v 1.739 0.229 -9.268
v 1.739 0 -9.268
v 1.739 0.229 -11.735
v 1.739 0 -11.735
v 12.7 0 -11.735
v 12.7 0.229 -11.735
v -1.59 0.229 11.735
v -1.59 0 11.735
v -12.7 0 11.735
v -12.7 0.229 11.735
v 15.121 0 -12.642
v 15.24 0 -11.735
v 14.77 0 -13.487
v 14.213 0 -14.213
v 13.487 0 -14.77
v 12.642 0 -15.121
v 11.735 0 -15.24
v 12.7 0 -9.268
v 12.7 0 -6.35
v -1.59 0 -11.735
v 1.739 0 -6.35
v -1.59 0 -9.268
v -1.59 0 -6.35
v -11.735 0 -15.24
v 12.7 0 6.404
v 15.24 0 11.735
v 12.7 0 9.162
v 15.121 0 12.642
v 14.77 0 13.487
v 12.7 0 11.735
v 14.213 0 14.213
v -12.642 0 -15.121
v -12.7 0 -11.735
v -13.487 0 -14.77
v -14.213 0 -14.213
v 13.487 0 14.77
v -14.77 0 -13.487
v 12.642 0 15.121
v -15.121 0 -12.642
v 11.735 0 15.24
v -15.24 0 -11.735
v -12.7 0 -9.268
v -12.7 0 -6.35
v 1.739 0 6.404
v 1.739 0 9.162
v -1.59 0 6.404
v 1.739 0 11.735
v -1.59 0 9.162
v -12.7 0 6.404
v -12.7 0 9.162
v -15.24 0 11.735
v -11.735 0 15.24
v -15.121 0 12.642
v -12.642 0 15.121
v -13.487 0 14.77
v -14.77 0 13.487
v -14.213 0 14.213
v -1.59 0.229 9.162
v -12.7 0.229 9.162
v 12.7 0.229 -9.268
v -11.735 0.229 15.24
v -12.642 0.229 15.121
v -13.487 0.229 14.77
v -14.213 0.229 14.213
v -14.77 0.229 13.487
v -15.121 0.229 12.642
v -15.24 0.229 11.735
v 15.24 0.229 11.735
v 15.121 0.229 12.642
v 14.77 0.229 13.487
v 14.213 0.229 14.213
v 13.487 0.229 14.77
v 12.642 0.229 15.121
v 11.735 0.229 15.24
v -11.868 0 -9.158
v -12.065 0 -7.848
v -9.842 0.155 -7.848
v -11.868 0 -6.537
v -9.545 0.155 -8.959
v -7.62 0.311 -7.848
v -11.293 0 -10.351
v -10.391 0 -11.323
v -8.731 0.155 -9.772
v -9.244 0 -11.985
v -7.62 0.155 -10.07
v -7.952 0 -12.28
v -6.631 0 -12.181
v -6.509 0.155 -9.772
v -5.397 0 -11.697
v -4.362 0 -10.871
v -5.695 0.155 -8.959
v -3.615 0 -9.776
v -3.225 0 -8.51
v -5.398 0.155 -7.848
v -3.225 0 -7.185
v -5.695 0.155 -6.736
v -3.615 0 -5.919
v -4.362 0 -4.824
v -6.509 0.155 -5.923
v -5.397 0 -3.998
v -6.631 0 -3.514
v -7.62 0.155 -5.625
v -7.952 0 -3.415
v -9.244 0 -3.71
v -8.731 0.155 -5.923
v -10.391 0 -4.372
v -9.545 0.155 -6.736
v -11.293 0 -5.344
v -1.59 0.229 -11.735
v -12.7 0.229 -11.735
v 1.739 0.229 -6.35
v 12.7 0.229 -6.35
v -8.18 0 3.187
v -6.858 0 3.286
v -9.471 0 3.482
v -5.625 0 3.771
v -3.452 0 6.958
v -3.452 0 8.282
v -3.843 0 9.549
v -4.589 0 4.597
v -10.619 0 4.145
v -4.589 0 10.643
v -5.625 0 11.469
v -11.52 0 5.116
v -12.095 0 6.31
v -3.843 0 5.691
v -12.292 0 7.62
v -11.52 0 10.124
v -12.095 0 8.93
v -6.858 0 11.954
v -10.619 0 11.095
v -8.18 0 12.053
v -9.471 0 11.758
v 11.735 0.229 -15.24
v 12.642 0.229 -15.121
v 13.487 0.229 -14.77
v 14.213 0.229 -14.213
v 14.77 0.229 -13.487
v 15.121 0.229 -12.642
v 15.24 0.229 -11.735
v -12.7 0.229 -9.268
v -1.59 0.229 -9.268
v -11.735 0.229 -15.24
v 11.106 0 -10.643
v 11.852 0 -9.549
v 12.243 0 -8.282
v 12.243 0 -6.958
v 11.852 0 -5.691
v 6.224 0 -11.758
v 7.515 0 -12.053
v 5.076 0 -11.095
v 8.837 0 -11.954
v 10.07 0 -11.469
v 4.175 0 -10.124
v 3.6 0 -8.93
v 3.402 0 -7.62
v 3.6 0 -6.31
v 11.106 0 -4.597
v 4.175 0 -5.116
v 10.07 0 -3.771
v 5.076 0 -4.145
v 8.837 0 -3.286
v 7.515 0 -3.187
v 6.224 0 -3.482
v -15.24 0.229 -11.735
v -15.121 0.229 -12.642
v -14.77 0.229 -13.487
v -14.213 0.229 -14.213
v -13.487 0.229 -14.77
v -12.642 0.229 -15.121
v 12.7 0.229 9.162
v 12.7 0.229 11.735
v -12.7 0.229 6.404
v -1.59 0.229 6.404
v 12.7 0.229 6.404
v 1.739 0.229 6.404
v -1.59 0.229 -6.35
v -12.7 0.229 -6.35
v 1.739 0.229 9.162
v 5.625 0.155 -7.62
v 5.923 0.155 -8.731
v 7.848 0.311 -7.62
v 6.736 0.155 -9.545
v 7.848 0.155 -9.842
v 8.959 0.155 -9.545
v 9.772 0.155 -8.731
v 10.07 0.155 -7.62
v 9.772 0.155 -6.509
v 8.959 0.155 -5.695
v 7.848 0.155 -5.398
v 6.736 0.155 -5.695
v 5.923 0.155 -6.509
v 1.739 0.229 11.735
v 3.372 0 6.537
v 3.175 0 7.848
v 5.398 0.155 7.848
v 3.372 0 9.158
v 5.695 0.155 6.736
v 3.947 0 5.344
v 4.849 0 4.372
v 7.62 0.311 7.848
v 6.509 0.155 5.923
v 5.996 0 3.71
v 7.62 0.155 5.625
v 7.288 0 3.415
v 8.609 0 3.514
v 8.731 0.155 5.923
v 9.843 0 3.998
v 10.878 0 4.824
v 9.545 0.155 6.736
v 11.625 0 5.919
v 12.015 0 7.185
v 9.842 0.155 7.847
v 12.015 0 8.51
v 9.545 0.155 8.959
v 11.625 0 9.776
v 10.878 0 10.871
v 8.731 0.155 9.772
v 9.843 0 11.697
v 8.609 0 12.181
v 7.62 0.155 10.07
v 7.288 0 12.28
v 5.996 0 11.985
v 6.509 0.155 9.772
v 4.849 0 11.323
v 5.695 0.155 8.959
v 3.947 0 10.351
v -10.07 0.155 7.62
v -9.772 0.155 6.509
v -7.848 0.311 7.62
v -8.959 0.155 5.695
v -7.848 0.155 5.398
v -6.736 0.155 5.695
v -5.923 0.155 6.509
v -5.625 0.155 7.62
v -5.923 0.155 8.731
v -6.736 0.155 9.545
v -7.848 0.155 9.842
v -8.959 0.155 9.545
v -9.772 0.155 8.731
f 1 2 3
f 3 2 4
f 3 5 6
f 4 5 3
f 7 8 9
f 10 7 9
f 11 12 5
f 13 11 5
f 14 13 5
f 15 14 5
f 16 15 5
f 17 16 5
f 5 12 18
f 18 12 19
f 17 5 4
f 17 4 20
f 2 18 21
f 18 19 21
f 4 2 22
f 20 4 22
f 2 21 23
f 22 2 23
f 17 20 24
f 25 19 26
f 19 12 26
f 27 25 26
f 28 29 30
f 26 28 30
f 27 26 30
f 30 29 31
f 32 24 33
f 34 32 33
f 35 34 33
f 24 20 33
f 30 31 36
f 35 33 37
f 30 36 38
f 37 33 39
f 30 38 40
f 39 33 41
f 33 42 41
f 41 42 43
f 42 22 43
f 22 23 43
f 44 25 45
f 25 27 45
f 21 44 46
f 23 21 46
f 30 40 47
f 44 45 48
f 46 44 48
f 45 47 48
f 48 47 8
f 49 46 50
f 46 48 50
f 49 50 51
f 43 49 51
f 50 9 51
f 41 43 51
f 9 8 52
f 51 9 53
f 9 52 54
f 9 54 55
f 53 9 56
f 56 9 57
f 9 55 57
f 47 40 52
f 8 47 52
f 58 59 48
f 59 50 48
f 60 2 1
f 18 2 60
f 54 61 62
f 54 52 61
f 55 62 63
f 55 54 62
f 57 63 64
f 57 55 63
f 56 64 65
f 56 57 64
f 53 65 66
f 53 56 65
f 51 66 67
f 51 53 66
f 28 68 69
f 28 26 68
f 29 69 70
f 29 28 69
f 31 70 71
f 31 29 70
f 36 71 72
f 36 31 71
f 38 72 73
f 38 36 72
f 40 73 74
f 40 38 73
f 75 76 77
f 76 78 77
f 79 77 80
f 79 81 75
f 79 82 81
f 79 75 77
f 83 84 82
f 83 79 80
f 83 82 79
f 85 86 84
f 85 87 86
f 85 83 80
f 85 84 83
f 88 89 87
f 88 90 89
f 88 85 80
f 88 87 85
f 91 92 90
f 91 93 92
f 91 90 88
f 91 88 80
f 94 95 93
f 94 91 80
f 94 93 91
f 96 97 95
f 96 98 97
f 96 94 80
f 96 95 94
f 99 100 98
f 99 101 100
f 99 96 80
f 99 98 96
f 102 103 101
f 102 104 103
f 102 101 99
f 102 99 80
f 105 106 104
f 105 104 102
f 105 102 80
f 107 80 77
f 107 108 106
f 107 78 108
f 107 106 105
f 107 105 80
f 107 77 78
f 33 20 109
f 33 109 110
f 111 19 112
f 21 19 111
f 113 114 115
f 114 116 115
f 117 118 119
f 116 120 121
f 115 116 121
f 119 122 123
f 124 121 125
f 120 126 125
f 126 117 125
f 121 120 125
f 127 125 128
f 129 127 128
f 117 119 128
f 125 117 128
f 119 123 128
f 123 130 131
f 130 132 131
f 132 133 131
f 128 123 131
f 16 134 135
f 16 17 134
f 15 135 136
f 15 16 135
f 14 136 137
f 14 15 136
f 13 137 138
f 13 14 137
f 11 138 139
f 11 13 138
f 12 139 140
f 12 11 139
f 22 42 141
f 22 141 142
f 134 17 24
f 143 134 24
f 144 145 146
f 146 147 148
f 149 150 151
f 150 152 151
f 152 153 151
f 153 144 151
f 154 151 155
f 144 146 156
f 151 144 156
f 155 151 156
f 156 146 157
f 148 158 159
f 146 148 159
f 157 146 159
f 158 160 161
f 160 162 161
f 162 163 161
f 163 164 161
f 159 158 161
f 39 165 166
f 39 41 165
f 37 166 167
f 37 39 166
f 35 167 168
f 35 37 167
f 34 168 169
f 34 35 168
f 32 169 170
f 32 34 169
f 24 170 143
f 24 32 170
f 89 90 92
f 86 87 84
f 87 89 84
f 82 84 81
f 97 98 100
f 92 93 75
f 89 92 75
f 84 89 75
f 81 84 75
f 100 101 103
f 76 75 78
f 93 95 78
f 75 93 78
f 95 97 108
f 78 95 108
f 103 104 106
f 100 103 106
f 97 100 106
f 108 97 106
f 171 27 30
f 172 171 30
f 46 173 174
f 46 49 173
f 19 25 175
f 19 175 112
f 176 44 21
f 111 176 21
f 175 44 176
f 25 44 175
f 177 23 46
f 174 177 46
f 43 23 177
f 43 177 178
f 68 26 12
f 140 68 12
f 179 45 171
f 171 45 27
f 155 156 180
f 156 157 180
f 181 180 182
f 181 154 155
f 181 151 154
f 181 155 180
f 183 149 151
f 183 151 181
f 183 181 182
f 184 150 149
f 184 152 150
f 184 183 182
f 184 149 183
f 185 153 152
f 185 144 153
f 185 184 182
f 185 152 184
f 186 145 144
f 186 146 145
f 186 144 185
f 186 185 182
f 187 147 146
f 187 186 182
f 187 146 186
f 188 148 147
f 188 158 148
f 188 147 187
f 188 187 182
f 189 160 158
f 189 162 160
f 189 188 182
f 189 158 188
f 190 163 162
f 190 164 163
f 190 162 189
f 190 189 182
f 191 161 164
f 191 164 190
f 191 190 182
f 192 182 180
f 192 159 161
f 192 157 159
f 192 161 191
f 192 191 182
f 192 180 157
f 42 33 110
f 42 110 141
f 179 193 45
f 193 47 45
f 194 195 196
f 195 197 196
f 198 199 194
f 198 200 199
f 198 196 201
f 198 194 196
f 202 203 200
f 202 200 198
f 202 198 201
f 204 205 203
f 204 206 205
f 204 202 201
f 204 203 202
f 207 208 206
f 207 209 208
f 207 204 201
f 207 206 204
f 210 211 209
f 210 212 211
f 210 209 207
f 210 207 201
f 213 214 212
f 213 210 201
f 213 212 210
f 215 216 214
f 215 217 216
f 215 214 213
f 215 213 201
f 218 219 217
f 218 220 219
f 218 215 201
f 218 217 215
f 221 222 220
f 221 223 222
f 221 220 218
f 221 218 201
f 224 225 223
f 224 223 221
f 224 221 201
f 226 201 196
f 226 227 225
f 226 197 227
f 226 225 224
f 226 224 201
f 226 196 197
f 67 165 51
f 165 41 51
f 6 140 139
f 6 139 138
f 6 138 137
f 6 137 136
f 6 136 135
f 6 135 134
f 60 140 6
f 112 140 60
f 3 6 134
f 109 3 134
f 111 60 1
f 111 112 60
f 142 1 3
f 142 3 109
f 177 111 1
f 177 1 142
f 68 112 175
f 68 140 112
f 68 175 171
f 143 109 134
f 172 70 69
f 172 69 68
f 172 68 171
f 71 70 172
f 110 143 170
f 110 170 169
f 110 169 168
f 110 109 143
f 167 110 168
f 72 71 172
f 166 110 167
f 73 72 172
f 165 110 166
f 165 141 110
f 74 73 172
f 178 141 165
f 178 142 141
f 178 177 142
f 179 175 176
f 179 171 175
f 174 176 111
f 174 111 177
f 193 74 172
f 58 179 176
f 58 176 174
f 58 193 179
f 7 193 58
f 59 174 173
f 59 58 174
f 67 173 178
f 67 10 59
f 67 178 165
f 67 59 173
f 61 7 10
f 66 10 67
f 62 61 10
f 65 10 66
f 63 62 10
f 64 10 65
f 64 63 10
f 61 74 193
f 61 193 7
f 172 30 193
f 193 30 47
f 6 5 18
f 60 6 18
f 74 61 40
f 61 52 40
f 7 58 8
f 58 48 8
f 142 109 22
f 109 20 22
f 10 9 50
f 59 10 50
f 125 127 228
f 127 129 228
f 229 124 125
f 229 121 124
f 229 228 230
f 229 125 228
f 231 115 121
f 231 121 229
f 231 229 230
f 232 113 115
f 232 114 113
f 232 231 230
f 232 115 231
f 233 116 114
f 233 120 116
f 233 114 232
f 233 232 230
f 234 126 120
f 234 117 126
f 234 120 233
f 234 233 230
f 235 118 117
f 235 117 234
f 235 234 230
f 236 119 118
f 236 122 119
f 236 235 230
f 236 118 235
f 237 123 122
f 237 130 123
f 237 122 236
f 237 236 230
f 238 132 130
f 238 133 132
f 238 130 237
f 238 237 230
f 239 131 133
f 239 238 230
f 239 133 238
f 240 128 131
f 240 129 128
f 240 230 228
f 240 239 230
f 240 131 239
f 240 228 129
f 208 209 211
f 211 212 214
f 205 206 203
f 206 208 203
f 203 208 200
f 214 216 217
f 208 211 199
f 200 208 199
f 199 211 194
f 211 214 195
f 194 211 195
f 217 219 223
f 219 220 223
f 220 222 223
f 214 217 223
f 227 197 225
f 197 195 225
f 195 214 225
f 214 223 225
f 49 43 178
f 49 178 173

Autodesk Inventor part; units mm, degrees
ref_plane "YZ Plane" through (0, 0, 0) normal (1, 0, 0) x (0, 1, 0)
ref_plane "XZ Plane" through (0, 0, 0) normal (0, 1, 0) x (-1, 0, 0)
ref_plane "XY Plane" through (0, 0, 0) normal (0, 0, 1) x (1, 0, 0)
sketch "Sketch1" plane through (0, 0, 0) normal (0, 1, 0) x (-1, 0, 0)
  line L0 (-15.24, 11.7348) -> (-15.24, -11.7348)
  line L1 (-11.7348, -15.24) -> (11.7348, -15.24)
  line L2 (15.24, -11.7348) -> (15.24, 11.7348)
  line L3 (11.7348, 15.24) -> (-11.7348, 15.24)
  line L4 (-15.24, 15.24) -> (15.24, -15.24) construction
  line L5 (-15.24, -15.24) -> (15.24, 15.24) construction
  arc A0 (15.24, 11.7348) -> (11.7348, 15.24) centre (11.7348, 11.7348) ccw
  arc A1 (11.7348, -15.24) -> (15.24, -11.7348) centre (11.7348, -11.7348) ccw
  arc A2 (-15.24, -11.7348) -> (-11.7348, -15.24) centre (-11.7348, -11.7348) ccw
  arc A3 (-11.7348, 15.24) -> (-15.24, 11.7348) centre (-11.7348, 11.7348) ccw
  line L6 (-18.4479, 18.3502) -> (18.4026, 18.3502) construction
  line L7 (18.4026, 18.3502) -> (18.4026, -18.5003) construction
  line L8 (18.4026, -18.5003) -> (-18.4479, -18.5003) construction
  line L9 (-18.4479, -18.5003) -> (-18.4479, 18.3502) construction
  line L10 (12.7, 11.7348) -> (12.7, 9.1616)
  arc A4 (11.7348, -12.7) -> (12.7, -11.7348) centre (11.7348, -11.7348) ccw
  line L11 (11.7348, -12.7) -> (-11.7348, -12.7)
  arc A5 (-12.7, -11.7348) -> (-11.7348, -12.7) centre (-11.7348, -11.7348) ccw
  line L12 (-12.7, -11.7348) -> (-12.7, -9.2677)
  arc A6 (-11.7348, 12.7) -> (-12.7, 11.7348) centre (-11.7348, 11.7348) ccw
  line L13 (-11.7348, 12.7) -> (11.7348, 12.7)
  arc A7 (12.7, 11.7348) -> (11.7348, 12.7) centre (11.7348, 11.7348) ccw
  line L14 (12.7, 9.1616) -> (1.5905, 9.1616)
  line L15 (-12.7, 9.1616) -> (-12.7, 11.7348)
  line L16 (-12.7, 11.7348) -> (-1.7389, 11.7348)
  line L17 (12.7, 11.7348) -> (12.7, 9.1616)
  line L18 (12.7, -9.2677) -> (1.5905, -9.2677)
  line L19 (-12.7, -9.2677) -> (-12.7, -11.7348)
  line L20 (-12.7, -11.7348) -> (-1.7389, -11.7348)
  line L21 (12.7, -11.7348) -> (12.7, -9.2677)
  line L22 (-12.7, 9.1616) -> (-12.7, 11.7348)
  line L23 (12.7, 6.4035) -> (6.4035, 6.4035)
  line L24 (-12.7, 6.4035) -> (-12.7, -6.3499)
  line L25 (-12.7, -6.3499) -> (-1.7389, -6.3499)
  line L26 (12.7, -6.3499) -> (12.7, 6.4035)
  line L27 (12.7, -6.3499) -> (12.7, -9.2677)
  line L28 (12.7, 6.4035) -> (12.7, -6.3499)
  line L29 (12.7, 9.1616) -> (12.7, 6.4035)
  line L30 (12.7, -9.2677) -> (12.7, -11.7348)
  line L31 (-12.7, -9.2677) -> (-12.7, -6.3499)
  line L32 (-12.7, -6.3499) -> (-12.7, 6.4035)
  line L33 (-12.7, 6.4035) -> (-12.7, 9.1616)
  line L34 (1.5905, 11.7348) -> (-1.7389, 11.7348)
  line L35 (-1.7389, 11.7348) -> (-1.7389, -11.7348)
  line L36 (-1.7389, -11.7348) -> (1.5905, -11.7348)
  line L37 (1.5905, -11.7348) -> (1.5905, 11.7348)
  line L38 (1.5905, 11.7348) -> (12.7, 11.7348)
  line L39 (-1.7389, 11.7348) -> (1.5905, 11.7348)
  line L40 (1.5905, -11.7348) -> (12.7, -11.7348)
  line L41 (-1.7389, -11.7348) -> (1.5905, -11.7348)
  line L42 (1.5905, 9.1616) -> (-1.7389, 9.1616)
  line L43 (-1.7389, 9.1616) -> (-12.7, 9.1616)
  line L44 (6.4035, 6.4035) -> (1.5905, 6.4035)
  line L45 (1.5905, 6.4035) -> (-1.7389, 6.4035)
  line L46 (6.3499, -6.3499) -> (12.7, -6.3499)
  line L47 (1.5905, -6.3499) -> (6.3499, -6.3499)
  line L48 (1.5905, -9.2677) -> (-1.7389, -9.2677)
  line L49 (-1.7389, -9.2677) -> (-12.7, -9.2677)
  line L50 (-1.7389, -6.3499) -> (1.5905, -6.3499)
  line L51 (-1.7389, 6.4035) -> (-12.7, 6.4035)
  point P0 (0, 0)
  dimension "d15" = 30.48
  dimension "d16" = 30.48
  dimension "d17" = 3.5052
  dimension "d21" = 2.54
extrude "Extrusion1" add sketch "Sketch1" along normal blind 0.2286 contours A3 L3 A0 L2 A1 L1 A2 L0 | L38 L34 L16 A6 L13 A7 | L29 L23 L44 L37 L14 | L37 L42 L35 L34 | L37 L45 L35 L42 | L37 L50 L35 L45 | L35 L51 L33 L43 | L27 L18 L37 L47 L46 | L37 L48 L35 L50 | L37 L36 L35 L48 | L35 L49 L31 L25 | A4 L11 A5 L20 L36 L40
sketch "Sketch2" plane through (0, 0, 0) normal (0, 1, 0) x (-1, 0, 0)
  circle A0 centre (7.8475, 7.62) radius 4.445
  line L0 (17.2095, 0) -> (-17.2095, 0) projected
  line L1 (0, -17.2095) -> (0, 17.2095) projected
  circle A1 centre (-7.62, 7.8475) radius 4.445
  circle A2 centre (-7.8475, -7.62) radius 4.445
  circle A3 centre (7.62, -7.8475) radius 4.445
  point P0 (0, 0)
  dimension "d24" = 8.89
  dimension "d25" = 7.62
  dimension "d28" = 360
extrude "Extrusion2" add sketch "Sketch2" along normal blind 0.3302 draft -86 separate body
properties part number "PCB Dome Array Tape"
